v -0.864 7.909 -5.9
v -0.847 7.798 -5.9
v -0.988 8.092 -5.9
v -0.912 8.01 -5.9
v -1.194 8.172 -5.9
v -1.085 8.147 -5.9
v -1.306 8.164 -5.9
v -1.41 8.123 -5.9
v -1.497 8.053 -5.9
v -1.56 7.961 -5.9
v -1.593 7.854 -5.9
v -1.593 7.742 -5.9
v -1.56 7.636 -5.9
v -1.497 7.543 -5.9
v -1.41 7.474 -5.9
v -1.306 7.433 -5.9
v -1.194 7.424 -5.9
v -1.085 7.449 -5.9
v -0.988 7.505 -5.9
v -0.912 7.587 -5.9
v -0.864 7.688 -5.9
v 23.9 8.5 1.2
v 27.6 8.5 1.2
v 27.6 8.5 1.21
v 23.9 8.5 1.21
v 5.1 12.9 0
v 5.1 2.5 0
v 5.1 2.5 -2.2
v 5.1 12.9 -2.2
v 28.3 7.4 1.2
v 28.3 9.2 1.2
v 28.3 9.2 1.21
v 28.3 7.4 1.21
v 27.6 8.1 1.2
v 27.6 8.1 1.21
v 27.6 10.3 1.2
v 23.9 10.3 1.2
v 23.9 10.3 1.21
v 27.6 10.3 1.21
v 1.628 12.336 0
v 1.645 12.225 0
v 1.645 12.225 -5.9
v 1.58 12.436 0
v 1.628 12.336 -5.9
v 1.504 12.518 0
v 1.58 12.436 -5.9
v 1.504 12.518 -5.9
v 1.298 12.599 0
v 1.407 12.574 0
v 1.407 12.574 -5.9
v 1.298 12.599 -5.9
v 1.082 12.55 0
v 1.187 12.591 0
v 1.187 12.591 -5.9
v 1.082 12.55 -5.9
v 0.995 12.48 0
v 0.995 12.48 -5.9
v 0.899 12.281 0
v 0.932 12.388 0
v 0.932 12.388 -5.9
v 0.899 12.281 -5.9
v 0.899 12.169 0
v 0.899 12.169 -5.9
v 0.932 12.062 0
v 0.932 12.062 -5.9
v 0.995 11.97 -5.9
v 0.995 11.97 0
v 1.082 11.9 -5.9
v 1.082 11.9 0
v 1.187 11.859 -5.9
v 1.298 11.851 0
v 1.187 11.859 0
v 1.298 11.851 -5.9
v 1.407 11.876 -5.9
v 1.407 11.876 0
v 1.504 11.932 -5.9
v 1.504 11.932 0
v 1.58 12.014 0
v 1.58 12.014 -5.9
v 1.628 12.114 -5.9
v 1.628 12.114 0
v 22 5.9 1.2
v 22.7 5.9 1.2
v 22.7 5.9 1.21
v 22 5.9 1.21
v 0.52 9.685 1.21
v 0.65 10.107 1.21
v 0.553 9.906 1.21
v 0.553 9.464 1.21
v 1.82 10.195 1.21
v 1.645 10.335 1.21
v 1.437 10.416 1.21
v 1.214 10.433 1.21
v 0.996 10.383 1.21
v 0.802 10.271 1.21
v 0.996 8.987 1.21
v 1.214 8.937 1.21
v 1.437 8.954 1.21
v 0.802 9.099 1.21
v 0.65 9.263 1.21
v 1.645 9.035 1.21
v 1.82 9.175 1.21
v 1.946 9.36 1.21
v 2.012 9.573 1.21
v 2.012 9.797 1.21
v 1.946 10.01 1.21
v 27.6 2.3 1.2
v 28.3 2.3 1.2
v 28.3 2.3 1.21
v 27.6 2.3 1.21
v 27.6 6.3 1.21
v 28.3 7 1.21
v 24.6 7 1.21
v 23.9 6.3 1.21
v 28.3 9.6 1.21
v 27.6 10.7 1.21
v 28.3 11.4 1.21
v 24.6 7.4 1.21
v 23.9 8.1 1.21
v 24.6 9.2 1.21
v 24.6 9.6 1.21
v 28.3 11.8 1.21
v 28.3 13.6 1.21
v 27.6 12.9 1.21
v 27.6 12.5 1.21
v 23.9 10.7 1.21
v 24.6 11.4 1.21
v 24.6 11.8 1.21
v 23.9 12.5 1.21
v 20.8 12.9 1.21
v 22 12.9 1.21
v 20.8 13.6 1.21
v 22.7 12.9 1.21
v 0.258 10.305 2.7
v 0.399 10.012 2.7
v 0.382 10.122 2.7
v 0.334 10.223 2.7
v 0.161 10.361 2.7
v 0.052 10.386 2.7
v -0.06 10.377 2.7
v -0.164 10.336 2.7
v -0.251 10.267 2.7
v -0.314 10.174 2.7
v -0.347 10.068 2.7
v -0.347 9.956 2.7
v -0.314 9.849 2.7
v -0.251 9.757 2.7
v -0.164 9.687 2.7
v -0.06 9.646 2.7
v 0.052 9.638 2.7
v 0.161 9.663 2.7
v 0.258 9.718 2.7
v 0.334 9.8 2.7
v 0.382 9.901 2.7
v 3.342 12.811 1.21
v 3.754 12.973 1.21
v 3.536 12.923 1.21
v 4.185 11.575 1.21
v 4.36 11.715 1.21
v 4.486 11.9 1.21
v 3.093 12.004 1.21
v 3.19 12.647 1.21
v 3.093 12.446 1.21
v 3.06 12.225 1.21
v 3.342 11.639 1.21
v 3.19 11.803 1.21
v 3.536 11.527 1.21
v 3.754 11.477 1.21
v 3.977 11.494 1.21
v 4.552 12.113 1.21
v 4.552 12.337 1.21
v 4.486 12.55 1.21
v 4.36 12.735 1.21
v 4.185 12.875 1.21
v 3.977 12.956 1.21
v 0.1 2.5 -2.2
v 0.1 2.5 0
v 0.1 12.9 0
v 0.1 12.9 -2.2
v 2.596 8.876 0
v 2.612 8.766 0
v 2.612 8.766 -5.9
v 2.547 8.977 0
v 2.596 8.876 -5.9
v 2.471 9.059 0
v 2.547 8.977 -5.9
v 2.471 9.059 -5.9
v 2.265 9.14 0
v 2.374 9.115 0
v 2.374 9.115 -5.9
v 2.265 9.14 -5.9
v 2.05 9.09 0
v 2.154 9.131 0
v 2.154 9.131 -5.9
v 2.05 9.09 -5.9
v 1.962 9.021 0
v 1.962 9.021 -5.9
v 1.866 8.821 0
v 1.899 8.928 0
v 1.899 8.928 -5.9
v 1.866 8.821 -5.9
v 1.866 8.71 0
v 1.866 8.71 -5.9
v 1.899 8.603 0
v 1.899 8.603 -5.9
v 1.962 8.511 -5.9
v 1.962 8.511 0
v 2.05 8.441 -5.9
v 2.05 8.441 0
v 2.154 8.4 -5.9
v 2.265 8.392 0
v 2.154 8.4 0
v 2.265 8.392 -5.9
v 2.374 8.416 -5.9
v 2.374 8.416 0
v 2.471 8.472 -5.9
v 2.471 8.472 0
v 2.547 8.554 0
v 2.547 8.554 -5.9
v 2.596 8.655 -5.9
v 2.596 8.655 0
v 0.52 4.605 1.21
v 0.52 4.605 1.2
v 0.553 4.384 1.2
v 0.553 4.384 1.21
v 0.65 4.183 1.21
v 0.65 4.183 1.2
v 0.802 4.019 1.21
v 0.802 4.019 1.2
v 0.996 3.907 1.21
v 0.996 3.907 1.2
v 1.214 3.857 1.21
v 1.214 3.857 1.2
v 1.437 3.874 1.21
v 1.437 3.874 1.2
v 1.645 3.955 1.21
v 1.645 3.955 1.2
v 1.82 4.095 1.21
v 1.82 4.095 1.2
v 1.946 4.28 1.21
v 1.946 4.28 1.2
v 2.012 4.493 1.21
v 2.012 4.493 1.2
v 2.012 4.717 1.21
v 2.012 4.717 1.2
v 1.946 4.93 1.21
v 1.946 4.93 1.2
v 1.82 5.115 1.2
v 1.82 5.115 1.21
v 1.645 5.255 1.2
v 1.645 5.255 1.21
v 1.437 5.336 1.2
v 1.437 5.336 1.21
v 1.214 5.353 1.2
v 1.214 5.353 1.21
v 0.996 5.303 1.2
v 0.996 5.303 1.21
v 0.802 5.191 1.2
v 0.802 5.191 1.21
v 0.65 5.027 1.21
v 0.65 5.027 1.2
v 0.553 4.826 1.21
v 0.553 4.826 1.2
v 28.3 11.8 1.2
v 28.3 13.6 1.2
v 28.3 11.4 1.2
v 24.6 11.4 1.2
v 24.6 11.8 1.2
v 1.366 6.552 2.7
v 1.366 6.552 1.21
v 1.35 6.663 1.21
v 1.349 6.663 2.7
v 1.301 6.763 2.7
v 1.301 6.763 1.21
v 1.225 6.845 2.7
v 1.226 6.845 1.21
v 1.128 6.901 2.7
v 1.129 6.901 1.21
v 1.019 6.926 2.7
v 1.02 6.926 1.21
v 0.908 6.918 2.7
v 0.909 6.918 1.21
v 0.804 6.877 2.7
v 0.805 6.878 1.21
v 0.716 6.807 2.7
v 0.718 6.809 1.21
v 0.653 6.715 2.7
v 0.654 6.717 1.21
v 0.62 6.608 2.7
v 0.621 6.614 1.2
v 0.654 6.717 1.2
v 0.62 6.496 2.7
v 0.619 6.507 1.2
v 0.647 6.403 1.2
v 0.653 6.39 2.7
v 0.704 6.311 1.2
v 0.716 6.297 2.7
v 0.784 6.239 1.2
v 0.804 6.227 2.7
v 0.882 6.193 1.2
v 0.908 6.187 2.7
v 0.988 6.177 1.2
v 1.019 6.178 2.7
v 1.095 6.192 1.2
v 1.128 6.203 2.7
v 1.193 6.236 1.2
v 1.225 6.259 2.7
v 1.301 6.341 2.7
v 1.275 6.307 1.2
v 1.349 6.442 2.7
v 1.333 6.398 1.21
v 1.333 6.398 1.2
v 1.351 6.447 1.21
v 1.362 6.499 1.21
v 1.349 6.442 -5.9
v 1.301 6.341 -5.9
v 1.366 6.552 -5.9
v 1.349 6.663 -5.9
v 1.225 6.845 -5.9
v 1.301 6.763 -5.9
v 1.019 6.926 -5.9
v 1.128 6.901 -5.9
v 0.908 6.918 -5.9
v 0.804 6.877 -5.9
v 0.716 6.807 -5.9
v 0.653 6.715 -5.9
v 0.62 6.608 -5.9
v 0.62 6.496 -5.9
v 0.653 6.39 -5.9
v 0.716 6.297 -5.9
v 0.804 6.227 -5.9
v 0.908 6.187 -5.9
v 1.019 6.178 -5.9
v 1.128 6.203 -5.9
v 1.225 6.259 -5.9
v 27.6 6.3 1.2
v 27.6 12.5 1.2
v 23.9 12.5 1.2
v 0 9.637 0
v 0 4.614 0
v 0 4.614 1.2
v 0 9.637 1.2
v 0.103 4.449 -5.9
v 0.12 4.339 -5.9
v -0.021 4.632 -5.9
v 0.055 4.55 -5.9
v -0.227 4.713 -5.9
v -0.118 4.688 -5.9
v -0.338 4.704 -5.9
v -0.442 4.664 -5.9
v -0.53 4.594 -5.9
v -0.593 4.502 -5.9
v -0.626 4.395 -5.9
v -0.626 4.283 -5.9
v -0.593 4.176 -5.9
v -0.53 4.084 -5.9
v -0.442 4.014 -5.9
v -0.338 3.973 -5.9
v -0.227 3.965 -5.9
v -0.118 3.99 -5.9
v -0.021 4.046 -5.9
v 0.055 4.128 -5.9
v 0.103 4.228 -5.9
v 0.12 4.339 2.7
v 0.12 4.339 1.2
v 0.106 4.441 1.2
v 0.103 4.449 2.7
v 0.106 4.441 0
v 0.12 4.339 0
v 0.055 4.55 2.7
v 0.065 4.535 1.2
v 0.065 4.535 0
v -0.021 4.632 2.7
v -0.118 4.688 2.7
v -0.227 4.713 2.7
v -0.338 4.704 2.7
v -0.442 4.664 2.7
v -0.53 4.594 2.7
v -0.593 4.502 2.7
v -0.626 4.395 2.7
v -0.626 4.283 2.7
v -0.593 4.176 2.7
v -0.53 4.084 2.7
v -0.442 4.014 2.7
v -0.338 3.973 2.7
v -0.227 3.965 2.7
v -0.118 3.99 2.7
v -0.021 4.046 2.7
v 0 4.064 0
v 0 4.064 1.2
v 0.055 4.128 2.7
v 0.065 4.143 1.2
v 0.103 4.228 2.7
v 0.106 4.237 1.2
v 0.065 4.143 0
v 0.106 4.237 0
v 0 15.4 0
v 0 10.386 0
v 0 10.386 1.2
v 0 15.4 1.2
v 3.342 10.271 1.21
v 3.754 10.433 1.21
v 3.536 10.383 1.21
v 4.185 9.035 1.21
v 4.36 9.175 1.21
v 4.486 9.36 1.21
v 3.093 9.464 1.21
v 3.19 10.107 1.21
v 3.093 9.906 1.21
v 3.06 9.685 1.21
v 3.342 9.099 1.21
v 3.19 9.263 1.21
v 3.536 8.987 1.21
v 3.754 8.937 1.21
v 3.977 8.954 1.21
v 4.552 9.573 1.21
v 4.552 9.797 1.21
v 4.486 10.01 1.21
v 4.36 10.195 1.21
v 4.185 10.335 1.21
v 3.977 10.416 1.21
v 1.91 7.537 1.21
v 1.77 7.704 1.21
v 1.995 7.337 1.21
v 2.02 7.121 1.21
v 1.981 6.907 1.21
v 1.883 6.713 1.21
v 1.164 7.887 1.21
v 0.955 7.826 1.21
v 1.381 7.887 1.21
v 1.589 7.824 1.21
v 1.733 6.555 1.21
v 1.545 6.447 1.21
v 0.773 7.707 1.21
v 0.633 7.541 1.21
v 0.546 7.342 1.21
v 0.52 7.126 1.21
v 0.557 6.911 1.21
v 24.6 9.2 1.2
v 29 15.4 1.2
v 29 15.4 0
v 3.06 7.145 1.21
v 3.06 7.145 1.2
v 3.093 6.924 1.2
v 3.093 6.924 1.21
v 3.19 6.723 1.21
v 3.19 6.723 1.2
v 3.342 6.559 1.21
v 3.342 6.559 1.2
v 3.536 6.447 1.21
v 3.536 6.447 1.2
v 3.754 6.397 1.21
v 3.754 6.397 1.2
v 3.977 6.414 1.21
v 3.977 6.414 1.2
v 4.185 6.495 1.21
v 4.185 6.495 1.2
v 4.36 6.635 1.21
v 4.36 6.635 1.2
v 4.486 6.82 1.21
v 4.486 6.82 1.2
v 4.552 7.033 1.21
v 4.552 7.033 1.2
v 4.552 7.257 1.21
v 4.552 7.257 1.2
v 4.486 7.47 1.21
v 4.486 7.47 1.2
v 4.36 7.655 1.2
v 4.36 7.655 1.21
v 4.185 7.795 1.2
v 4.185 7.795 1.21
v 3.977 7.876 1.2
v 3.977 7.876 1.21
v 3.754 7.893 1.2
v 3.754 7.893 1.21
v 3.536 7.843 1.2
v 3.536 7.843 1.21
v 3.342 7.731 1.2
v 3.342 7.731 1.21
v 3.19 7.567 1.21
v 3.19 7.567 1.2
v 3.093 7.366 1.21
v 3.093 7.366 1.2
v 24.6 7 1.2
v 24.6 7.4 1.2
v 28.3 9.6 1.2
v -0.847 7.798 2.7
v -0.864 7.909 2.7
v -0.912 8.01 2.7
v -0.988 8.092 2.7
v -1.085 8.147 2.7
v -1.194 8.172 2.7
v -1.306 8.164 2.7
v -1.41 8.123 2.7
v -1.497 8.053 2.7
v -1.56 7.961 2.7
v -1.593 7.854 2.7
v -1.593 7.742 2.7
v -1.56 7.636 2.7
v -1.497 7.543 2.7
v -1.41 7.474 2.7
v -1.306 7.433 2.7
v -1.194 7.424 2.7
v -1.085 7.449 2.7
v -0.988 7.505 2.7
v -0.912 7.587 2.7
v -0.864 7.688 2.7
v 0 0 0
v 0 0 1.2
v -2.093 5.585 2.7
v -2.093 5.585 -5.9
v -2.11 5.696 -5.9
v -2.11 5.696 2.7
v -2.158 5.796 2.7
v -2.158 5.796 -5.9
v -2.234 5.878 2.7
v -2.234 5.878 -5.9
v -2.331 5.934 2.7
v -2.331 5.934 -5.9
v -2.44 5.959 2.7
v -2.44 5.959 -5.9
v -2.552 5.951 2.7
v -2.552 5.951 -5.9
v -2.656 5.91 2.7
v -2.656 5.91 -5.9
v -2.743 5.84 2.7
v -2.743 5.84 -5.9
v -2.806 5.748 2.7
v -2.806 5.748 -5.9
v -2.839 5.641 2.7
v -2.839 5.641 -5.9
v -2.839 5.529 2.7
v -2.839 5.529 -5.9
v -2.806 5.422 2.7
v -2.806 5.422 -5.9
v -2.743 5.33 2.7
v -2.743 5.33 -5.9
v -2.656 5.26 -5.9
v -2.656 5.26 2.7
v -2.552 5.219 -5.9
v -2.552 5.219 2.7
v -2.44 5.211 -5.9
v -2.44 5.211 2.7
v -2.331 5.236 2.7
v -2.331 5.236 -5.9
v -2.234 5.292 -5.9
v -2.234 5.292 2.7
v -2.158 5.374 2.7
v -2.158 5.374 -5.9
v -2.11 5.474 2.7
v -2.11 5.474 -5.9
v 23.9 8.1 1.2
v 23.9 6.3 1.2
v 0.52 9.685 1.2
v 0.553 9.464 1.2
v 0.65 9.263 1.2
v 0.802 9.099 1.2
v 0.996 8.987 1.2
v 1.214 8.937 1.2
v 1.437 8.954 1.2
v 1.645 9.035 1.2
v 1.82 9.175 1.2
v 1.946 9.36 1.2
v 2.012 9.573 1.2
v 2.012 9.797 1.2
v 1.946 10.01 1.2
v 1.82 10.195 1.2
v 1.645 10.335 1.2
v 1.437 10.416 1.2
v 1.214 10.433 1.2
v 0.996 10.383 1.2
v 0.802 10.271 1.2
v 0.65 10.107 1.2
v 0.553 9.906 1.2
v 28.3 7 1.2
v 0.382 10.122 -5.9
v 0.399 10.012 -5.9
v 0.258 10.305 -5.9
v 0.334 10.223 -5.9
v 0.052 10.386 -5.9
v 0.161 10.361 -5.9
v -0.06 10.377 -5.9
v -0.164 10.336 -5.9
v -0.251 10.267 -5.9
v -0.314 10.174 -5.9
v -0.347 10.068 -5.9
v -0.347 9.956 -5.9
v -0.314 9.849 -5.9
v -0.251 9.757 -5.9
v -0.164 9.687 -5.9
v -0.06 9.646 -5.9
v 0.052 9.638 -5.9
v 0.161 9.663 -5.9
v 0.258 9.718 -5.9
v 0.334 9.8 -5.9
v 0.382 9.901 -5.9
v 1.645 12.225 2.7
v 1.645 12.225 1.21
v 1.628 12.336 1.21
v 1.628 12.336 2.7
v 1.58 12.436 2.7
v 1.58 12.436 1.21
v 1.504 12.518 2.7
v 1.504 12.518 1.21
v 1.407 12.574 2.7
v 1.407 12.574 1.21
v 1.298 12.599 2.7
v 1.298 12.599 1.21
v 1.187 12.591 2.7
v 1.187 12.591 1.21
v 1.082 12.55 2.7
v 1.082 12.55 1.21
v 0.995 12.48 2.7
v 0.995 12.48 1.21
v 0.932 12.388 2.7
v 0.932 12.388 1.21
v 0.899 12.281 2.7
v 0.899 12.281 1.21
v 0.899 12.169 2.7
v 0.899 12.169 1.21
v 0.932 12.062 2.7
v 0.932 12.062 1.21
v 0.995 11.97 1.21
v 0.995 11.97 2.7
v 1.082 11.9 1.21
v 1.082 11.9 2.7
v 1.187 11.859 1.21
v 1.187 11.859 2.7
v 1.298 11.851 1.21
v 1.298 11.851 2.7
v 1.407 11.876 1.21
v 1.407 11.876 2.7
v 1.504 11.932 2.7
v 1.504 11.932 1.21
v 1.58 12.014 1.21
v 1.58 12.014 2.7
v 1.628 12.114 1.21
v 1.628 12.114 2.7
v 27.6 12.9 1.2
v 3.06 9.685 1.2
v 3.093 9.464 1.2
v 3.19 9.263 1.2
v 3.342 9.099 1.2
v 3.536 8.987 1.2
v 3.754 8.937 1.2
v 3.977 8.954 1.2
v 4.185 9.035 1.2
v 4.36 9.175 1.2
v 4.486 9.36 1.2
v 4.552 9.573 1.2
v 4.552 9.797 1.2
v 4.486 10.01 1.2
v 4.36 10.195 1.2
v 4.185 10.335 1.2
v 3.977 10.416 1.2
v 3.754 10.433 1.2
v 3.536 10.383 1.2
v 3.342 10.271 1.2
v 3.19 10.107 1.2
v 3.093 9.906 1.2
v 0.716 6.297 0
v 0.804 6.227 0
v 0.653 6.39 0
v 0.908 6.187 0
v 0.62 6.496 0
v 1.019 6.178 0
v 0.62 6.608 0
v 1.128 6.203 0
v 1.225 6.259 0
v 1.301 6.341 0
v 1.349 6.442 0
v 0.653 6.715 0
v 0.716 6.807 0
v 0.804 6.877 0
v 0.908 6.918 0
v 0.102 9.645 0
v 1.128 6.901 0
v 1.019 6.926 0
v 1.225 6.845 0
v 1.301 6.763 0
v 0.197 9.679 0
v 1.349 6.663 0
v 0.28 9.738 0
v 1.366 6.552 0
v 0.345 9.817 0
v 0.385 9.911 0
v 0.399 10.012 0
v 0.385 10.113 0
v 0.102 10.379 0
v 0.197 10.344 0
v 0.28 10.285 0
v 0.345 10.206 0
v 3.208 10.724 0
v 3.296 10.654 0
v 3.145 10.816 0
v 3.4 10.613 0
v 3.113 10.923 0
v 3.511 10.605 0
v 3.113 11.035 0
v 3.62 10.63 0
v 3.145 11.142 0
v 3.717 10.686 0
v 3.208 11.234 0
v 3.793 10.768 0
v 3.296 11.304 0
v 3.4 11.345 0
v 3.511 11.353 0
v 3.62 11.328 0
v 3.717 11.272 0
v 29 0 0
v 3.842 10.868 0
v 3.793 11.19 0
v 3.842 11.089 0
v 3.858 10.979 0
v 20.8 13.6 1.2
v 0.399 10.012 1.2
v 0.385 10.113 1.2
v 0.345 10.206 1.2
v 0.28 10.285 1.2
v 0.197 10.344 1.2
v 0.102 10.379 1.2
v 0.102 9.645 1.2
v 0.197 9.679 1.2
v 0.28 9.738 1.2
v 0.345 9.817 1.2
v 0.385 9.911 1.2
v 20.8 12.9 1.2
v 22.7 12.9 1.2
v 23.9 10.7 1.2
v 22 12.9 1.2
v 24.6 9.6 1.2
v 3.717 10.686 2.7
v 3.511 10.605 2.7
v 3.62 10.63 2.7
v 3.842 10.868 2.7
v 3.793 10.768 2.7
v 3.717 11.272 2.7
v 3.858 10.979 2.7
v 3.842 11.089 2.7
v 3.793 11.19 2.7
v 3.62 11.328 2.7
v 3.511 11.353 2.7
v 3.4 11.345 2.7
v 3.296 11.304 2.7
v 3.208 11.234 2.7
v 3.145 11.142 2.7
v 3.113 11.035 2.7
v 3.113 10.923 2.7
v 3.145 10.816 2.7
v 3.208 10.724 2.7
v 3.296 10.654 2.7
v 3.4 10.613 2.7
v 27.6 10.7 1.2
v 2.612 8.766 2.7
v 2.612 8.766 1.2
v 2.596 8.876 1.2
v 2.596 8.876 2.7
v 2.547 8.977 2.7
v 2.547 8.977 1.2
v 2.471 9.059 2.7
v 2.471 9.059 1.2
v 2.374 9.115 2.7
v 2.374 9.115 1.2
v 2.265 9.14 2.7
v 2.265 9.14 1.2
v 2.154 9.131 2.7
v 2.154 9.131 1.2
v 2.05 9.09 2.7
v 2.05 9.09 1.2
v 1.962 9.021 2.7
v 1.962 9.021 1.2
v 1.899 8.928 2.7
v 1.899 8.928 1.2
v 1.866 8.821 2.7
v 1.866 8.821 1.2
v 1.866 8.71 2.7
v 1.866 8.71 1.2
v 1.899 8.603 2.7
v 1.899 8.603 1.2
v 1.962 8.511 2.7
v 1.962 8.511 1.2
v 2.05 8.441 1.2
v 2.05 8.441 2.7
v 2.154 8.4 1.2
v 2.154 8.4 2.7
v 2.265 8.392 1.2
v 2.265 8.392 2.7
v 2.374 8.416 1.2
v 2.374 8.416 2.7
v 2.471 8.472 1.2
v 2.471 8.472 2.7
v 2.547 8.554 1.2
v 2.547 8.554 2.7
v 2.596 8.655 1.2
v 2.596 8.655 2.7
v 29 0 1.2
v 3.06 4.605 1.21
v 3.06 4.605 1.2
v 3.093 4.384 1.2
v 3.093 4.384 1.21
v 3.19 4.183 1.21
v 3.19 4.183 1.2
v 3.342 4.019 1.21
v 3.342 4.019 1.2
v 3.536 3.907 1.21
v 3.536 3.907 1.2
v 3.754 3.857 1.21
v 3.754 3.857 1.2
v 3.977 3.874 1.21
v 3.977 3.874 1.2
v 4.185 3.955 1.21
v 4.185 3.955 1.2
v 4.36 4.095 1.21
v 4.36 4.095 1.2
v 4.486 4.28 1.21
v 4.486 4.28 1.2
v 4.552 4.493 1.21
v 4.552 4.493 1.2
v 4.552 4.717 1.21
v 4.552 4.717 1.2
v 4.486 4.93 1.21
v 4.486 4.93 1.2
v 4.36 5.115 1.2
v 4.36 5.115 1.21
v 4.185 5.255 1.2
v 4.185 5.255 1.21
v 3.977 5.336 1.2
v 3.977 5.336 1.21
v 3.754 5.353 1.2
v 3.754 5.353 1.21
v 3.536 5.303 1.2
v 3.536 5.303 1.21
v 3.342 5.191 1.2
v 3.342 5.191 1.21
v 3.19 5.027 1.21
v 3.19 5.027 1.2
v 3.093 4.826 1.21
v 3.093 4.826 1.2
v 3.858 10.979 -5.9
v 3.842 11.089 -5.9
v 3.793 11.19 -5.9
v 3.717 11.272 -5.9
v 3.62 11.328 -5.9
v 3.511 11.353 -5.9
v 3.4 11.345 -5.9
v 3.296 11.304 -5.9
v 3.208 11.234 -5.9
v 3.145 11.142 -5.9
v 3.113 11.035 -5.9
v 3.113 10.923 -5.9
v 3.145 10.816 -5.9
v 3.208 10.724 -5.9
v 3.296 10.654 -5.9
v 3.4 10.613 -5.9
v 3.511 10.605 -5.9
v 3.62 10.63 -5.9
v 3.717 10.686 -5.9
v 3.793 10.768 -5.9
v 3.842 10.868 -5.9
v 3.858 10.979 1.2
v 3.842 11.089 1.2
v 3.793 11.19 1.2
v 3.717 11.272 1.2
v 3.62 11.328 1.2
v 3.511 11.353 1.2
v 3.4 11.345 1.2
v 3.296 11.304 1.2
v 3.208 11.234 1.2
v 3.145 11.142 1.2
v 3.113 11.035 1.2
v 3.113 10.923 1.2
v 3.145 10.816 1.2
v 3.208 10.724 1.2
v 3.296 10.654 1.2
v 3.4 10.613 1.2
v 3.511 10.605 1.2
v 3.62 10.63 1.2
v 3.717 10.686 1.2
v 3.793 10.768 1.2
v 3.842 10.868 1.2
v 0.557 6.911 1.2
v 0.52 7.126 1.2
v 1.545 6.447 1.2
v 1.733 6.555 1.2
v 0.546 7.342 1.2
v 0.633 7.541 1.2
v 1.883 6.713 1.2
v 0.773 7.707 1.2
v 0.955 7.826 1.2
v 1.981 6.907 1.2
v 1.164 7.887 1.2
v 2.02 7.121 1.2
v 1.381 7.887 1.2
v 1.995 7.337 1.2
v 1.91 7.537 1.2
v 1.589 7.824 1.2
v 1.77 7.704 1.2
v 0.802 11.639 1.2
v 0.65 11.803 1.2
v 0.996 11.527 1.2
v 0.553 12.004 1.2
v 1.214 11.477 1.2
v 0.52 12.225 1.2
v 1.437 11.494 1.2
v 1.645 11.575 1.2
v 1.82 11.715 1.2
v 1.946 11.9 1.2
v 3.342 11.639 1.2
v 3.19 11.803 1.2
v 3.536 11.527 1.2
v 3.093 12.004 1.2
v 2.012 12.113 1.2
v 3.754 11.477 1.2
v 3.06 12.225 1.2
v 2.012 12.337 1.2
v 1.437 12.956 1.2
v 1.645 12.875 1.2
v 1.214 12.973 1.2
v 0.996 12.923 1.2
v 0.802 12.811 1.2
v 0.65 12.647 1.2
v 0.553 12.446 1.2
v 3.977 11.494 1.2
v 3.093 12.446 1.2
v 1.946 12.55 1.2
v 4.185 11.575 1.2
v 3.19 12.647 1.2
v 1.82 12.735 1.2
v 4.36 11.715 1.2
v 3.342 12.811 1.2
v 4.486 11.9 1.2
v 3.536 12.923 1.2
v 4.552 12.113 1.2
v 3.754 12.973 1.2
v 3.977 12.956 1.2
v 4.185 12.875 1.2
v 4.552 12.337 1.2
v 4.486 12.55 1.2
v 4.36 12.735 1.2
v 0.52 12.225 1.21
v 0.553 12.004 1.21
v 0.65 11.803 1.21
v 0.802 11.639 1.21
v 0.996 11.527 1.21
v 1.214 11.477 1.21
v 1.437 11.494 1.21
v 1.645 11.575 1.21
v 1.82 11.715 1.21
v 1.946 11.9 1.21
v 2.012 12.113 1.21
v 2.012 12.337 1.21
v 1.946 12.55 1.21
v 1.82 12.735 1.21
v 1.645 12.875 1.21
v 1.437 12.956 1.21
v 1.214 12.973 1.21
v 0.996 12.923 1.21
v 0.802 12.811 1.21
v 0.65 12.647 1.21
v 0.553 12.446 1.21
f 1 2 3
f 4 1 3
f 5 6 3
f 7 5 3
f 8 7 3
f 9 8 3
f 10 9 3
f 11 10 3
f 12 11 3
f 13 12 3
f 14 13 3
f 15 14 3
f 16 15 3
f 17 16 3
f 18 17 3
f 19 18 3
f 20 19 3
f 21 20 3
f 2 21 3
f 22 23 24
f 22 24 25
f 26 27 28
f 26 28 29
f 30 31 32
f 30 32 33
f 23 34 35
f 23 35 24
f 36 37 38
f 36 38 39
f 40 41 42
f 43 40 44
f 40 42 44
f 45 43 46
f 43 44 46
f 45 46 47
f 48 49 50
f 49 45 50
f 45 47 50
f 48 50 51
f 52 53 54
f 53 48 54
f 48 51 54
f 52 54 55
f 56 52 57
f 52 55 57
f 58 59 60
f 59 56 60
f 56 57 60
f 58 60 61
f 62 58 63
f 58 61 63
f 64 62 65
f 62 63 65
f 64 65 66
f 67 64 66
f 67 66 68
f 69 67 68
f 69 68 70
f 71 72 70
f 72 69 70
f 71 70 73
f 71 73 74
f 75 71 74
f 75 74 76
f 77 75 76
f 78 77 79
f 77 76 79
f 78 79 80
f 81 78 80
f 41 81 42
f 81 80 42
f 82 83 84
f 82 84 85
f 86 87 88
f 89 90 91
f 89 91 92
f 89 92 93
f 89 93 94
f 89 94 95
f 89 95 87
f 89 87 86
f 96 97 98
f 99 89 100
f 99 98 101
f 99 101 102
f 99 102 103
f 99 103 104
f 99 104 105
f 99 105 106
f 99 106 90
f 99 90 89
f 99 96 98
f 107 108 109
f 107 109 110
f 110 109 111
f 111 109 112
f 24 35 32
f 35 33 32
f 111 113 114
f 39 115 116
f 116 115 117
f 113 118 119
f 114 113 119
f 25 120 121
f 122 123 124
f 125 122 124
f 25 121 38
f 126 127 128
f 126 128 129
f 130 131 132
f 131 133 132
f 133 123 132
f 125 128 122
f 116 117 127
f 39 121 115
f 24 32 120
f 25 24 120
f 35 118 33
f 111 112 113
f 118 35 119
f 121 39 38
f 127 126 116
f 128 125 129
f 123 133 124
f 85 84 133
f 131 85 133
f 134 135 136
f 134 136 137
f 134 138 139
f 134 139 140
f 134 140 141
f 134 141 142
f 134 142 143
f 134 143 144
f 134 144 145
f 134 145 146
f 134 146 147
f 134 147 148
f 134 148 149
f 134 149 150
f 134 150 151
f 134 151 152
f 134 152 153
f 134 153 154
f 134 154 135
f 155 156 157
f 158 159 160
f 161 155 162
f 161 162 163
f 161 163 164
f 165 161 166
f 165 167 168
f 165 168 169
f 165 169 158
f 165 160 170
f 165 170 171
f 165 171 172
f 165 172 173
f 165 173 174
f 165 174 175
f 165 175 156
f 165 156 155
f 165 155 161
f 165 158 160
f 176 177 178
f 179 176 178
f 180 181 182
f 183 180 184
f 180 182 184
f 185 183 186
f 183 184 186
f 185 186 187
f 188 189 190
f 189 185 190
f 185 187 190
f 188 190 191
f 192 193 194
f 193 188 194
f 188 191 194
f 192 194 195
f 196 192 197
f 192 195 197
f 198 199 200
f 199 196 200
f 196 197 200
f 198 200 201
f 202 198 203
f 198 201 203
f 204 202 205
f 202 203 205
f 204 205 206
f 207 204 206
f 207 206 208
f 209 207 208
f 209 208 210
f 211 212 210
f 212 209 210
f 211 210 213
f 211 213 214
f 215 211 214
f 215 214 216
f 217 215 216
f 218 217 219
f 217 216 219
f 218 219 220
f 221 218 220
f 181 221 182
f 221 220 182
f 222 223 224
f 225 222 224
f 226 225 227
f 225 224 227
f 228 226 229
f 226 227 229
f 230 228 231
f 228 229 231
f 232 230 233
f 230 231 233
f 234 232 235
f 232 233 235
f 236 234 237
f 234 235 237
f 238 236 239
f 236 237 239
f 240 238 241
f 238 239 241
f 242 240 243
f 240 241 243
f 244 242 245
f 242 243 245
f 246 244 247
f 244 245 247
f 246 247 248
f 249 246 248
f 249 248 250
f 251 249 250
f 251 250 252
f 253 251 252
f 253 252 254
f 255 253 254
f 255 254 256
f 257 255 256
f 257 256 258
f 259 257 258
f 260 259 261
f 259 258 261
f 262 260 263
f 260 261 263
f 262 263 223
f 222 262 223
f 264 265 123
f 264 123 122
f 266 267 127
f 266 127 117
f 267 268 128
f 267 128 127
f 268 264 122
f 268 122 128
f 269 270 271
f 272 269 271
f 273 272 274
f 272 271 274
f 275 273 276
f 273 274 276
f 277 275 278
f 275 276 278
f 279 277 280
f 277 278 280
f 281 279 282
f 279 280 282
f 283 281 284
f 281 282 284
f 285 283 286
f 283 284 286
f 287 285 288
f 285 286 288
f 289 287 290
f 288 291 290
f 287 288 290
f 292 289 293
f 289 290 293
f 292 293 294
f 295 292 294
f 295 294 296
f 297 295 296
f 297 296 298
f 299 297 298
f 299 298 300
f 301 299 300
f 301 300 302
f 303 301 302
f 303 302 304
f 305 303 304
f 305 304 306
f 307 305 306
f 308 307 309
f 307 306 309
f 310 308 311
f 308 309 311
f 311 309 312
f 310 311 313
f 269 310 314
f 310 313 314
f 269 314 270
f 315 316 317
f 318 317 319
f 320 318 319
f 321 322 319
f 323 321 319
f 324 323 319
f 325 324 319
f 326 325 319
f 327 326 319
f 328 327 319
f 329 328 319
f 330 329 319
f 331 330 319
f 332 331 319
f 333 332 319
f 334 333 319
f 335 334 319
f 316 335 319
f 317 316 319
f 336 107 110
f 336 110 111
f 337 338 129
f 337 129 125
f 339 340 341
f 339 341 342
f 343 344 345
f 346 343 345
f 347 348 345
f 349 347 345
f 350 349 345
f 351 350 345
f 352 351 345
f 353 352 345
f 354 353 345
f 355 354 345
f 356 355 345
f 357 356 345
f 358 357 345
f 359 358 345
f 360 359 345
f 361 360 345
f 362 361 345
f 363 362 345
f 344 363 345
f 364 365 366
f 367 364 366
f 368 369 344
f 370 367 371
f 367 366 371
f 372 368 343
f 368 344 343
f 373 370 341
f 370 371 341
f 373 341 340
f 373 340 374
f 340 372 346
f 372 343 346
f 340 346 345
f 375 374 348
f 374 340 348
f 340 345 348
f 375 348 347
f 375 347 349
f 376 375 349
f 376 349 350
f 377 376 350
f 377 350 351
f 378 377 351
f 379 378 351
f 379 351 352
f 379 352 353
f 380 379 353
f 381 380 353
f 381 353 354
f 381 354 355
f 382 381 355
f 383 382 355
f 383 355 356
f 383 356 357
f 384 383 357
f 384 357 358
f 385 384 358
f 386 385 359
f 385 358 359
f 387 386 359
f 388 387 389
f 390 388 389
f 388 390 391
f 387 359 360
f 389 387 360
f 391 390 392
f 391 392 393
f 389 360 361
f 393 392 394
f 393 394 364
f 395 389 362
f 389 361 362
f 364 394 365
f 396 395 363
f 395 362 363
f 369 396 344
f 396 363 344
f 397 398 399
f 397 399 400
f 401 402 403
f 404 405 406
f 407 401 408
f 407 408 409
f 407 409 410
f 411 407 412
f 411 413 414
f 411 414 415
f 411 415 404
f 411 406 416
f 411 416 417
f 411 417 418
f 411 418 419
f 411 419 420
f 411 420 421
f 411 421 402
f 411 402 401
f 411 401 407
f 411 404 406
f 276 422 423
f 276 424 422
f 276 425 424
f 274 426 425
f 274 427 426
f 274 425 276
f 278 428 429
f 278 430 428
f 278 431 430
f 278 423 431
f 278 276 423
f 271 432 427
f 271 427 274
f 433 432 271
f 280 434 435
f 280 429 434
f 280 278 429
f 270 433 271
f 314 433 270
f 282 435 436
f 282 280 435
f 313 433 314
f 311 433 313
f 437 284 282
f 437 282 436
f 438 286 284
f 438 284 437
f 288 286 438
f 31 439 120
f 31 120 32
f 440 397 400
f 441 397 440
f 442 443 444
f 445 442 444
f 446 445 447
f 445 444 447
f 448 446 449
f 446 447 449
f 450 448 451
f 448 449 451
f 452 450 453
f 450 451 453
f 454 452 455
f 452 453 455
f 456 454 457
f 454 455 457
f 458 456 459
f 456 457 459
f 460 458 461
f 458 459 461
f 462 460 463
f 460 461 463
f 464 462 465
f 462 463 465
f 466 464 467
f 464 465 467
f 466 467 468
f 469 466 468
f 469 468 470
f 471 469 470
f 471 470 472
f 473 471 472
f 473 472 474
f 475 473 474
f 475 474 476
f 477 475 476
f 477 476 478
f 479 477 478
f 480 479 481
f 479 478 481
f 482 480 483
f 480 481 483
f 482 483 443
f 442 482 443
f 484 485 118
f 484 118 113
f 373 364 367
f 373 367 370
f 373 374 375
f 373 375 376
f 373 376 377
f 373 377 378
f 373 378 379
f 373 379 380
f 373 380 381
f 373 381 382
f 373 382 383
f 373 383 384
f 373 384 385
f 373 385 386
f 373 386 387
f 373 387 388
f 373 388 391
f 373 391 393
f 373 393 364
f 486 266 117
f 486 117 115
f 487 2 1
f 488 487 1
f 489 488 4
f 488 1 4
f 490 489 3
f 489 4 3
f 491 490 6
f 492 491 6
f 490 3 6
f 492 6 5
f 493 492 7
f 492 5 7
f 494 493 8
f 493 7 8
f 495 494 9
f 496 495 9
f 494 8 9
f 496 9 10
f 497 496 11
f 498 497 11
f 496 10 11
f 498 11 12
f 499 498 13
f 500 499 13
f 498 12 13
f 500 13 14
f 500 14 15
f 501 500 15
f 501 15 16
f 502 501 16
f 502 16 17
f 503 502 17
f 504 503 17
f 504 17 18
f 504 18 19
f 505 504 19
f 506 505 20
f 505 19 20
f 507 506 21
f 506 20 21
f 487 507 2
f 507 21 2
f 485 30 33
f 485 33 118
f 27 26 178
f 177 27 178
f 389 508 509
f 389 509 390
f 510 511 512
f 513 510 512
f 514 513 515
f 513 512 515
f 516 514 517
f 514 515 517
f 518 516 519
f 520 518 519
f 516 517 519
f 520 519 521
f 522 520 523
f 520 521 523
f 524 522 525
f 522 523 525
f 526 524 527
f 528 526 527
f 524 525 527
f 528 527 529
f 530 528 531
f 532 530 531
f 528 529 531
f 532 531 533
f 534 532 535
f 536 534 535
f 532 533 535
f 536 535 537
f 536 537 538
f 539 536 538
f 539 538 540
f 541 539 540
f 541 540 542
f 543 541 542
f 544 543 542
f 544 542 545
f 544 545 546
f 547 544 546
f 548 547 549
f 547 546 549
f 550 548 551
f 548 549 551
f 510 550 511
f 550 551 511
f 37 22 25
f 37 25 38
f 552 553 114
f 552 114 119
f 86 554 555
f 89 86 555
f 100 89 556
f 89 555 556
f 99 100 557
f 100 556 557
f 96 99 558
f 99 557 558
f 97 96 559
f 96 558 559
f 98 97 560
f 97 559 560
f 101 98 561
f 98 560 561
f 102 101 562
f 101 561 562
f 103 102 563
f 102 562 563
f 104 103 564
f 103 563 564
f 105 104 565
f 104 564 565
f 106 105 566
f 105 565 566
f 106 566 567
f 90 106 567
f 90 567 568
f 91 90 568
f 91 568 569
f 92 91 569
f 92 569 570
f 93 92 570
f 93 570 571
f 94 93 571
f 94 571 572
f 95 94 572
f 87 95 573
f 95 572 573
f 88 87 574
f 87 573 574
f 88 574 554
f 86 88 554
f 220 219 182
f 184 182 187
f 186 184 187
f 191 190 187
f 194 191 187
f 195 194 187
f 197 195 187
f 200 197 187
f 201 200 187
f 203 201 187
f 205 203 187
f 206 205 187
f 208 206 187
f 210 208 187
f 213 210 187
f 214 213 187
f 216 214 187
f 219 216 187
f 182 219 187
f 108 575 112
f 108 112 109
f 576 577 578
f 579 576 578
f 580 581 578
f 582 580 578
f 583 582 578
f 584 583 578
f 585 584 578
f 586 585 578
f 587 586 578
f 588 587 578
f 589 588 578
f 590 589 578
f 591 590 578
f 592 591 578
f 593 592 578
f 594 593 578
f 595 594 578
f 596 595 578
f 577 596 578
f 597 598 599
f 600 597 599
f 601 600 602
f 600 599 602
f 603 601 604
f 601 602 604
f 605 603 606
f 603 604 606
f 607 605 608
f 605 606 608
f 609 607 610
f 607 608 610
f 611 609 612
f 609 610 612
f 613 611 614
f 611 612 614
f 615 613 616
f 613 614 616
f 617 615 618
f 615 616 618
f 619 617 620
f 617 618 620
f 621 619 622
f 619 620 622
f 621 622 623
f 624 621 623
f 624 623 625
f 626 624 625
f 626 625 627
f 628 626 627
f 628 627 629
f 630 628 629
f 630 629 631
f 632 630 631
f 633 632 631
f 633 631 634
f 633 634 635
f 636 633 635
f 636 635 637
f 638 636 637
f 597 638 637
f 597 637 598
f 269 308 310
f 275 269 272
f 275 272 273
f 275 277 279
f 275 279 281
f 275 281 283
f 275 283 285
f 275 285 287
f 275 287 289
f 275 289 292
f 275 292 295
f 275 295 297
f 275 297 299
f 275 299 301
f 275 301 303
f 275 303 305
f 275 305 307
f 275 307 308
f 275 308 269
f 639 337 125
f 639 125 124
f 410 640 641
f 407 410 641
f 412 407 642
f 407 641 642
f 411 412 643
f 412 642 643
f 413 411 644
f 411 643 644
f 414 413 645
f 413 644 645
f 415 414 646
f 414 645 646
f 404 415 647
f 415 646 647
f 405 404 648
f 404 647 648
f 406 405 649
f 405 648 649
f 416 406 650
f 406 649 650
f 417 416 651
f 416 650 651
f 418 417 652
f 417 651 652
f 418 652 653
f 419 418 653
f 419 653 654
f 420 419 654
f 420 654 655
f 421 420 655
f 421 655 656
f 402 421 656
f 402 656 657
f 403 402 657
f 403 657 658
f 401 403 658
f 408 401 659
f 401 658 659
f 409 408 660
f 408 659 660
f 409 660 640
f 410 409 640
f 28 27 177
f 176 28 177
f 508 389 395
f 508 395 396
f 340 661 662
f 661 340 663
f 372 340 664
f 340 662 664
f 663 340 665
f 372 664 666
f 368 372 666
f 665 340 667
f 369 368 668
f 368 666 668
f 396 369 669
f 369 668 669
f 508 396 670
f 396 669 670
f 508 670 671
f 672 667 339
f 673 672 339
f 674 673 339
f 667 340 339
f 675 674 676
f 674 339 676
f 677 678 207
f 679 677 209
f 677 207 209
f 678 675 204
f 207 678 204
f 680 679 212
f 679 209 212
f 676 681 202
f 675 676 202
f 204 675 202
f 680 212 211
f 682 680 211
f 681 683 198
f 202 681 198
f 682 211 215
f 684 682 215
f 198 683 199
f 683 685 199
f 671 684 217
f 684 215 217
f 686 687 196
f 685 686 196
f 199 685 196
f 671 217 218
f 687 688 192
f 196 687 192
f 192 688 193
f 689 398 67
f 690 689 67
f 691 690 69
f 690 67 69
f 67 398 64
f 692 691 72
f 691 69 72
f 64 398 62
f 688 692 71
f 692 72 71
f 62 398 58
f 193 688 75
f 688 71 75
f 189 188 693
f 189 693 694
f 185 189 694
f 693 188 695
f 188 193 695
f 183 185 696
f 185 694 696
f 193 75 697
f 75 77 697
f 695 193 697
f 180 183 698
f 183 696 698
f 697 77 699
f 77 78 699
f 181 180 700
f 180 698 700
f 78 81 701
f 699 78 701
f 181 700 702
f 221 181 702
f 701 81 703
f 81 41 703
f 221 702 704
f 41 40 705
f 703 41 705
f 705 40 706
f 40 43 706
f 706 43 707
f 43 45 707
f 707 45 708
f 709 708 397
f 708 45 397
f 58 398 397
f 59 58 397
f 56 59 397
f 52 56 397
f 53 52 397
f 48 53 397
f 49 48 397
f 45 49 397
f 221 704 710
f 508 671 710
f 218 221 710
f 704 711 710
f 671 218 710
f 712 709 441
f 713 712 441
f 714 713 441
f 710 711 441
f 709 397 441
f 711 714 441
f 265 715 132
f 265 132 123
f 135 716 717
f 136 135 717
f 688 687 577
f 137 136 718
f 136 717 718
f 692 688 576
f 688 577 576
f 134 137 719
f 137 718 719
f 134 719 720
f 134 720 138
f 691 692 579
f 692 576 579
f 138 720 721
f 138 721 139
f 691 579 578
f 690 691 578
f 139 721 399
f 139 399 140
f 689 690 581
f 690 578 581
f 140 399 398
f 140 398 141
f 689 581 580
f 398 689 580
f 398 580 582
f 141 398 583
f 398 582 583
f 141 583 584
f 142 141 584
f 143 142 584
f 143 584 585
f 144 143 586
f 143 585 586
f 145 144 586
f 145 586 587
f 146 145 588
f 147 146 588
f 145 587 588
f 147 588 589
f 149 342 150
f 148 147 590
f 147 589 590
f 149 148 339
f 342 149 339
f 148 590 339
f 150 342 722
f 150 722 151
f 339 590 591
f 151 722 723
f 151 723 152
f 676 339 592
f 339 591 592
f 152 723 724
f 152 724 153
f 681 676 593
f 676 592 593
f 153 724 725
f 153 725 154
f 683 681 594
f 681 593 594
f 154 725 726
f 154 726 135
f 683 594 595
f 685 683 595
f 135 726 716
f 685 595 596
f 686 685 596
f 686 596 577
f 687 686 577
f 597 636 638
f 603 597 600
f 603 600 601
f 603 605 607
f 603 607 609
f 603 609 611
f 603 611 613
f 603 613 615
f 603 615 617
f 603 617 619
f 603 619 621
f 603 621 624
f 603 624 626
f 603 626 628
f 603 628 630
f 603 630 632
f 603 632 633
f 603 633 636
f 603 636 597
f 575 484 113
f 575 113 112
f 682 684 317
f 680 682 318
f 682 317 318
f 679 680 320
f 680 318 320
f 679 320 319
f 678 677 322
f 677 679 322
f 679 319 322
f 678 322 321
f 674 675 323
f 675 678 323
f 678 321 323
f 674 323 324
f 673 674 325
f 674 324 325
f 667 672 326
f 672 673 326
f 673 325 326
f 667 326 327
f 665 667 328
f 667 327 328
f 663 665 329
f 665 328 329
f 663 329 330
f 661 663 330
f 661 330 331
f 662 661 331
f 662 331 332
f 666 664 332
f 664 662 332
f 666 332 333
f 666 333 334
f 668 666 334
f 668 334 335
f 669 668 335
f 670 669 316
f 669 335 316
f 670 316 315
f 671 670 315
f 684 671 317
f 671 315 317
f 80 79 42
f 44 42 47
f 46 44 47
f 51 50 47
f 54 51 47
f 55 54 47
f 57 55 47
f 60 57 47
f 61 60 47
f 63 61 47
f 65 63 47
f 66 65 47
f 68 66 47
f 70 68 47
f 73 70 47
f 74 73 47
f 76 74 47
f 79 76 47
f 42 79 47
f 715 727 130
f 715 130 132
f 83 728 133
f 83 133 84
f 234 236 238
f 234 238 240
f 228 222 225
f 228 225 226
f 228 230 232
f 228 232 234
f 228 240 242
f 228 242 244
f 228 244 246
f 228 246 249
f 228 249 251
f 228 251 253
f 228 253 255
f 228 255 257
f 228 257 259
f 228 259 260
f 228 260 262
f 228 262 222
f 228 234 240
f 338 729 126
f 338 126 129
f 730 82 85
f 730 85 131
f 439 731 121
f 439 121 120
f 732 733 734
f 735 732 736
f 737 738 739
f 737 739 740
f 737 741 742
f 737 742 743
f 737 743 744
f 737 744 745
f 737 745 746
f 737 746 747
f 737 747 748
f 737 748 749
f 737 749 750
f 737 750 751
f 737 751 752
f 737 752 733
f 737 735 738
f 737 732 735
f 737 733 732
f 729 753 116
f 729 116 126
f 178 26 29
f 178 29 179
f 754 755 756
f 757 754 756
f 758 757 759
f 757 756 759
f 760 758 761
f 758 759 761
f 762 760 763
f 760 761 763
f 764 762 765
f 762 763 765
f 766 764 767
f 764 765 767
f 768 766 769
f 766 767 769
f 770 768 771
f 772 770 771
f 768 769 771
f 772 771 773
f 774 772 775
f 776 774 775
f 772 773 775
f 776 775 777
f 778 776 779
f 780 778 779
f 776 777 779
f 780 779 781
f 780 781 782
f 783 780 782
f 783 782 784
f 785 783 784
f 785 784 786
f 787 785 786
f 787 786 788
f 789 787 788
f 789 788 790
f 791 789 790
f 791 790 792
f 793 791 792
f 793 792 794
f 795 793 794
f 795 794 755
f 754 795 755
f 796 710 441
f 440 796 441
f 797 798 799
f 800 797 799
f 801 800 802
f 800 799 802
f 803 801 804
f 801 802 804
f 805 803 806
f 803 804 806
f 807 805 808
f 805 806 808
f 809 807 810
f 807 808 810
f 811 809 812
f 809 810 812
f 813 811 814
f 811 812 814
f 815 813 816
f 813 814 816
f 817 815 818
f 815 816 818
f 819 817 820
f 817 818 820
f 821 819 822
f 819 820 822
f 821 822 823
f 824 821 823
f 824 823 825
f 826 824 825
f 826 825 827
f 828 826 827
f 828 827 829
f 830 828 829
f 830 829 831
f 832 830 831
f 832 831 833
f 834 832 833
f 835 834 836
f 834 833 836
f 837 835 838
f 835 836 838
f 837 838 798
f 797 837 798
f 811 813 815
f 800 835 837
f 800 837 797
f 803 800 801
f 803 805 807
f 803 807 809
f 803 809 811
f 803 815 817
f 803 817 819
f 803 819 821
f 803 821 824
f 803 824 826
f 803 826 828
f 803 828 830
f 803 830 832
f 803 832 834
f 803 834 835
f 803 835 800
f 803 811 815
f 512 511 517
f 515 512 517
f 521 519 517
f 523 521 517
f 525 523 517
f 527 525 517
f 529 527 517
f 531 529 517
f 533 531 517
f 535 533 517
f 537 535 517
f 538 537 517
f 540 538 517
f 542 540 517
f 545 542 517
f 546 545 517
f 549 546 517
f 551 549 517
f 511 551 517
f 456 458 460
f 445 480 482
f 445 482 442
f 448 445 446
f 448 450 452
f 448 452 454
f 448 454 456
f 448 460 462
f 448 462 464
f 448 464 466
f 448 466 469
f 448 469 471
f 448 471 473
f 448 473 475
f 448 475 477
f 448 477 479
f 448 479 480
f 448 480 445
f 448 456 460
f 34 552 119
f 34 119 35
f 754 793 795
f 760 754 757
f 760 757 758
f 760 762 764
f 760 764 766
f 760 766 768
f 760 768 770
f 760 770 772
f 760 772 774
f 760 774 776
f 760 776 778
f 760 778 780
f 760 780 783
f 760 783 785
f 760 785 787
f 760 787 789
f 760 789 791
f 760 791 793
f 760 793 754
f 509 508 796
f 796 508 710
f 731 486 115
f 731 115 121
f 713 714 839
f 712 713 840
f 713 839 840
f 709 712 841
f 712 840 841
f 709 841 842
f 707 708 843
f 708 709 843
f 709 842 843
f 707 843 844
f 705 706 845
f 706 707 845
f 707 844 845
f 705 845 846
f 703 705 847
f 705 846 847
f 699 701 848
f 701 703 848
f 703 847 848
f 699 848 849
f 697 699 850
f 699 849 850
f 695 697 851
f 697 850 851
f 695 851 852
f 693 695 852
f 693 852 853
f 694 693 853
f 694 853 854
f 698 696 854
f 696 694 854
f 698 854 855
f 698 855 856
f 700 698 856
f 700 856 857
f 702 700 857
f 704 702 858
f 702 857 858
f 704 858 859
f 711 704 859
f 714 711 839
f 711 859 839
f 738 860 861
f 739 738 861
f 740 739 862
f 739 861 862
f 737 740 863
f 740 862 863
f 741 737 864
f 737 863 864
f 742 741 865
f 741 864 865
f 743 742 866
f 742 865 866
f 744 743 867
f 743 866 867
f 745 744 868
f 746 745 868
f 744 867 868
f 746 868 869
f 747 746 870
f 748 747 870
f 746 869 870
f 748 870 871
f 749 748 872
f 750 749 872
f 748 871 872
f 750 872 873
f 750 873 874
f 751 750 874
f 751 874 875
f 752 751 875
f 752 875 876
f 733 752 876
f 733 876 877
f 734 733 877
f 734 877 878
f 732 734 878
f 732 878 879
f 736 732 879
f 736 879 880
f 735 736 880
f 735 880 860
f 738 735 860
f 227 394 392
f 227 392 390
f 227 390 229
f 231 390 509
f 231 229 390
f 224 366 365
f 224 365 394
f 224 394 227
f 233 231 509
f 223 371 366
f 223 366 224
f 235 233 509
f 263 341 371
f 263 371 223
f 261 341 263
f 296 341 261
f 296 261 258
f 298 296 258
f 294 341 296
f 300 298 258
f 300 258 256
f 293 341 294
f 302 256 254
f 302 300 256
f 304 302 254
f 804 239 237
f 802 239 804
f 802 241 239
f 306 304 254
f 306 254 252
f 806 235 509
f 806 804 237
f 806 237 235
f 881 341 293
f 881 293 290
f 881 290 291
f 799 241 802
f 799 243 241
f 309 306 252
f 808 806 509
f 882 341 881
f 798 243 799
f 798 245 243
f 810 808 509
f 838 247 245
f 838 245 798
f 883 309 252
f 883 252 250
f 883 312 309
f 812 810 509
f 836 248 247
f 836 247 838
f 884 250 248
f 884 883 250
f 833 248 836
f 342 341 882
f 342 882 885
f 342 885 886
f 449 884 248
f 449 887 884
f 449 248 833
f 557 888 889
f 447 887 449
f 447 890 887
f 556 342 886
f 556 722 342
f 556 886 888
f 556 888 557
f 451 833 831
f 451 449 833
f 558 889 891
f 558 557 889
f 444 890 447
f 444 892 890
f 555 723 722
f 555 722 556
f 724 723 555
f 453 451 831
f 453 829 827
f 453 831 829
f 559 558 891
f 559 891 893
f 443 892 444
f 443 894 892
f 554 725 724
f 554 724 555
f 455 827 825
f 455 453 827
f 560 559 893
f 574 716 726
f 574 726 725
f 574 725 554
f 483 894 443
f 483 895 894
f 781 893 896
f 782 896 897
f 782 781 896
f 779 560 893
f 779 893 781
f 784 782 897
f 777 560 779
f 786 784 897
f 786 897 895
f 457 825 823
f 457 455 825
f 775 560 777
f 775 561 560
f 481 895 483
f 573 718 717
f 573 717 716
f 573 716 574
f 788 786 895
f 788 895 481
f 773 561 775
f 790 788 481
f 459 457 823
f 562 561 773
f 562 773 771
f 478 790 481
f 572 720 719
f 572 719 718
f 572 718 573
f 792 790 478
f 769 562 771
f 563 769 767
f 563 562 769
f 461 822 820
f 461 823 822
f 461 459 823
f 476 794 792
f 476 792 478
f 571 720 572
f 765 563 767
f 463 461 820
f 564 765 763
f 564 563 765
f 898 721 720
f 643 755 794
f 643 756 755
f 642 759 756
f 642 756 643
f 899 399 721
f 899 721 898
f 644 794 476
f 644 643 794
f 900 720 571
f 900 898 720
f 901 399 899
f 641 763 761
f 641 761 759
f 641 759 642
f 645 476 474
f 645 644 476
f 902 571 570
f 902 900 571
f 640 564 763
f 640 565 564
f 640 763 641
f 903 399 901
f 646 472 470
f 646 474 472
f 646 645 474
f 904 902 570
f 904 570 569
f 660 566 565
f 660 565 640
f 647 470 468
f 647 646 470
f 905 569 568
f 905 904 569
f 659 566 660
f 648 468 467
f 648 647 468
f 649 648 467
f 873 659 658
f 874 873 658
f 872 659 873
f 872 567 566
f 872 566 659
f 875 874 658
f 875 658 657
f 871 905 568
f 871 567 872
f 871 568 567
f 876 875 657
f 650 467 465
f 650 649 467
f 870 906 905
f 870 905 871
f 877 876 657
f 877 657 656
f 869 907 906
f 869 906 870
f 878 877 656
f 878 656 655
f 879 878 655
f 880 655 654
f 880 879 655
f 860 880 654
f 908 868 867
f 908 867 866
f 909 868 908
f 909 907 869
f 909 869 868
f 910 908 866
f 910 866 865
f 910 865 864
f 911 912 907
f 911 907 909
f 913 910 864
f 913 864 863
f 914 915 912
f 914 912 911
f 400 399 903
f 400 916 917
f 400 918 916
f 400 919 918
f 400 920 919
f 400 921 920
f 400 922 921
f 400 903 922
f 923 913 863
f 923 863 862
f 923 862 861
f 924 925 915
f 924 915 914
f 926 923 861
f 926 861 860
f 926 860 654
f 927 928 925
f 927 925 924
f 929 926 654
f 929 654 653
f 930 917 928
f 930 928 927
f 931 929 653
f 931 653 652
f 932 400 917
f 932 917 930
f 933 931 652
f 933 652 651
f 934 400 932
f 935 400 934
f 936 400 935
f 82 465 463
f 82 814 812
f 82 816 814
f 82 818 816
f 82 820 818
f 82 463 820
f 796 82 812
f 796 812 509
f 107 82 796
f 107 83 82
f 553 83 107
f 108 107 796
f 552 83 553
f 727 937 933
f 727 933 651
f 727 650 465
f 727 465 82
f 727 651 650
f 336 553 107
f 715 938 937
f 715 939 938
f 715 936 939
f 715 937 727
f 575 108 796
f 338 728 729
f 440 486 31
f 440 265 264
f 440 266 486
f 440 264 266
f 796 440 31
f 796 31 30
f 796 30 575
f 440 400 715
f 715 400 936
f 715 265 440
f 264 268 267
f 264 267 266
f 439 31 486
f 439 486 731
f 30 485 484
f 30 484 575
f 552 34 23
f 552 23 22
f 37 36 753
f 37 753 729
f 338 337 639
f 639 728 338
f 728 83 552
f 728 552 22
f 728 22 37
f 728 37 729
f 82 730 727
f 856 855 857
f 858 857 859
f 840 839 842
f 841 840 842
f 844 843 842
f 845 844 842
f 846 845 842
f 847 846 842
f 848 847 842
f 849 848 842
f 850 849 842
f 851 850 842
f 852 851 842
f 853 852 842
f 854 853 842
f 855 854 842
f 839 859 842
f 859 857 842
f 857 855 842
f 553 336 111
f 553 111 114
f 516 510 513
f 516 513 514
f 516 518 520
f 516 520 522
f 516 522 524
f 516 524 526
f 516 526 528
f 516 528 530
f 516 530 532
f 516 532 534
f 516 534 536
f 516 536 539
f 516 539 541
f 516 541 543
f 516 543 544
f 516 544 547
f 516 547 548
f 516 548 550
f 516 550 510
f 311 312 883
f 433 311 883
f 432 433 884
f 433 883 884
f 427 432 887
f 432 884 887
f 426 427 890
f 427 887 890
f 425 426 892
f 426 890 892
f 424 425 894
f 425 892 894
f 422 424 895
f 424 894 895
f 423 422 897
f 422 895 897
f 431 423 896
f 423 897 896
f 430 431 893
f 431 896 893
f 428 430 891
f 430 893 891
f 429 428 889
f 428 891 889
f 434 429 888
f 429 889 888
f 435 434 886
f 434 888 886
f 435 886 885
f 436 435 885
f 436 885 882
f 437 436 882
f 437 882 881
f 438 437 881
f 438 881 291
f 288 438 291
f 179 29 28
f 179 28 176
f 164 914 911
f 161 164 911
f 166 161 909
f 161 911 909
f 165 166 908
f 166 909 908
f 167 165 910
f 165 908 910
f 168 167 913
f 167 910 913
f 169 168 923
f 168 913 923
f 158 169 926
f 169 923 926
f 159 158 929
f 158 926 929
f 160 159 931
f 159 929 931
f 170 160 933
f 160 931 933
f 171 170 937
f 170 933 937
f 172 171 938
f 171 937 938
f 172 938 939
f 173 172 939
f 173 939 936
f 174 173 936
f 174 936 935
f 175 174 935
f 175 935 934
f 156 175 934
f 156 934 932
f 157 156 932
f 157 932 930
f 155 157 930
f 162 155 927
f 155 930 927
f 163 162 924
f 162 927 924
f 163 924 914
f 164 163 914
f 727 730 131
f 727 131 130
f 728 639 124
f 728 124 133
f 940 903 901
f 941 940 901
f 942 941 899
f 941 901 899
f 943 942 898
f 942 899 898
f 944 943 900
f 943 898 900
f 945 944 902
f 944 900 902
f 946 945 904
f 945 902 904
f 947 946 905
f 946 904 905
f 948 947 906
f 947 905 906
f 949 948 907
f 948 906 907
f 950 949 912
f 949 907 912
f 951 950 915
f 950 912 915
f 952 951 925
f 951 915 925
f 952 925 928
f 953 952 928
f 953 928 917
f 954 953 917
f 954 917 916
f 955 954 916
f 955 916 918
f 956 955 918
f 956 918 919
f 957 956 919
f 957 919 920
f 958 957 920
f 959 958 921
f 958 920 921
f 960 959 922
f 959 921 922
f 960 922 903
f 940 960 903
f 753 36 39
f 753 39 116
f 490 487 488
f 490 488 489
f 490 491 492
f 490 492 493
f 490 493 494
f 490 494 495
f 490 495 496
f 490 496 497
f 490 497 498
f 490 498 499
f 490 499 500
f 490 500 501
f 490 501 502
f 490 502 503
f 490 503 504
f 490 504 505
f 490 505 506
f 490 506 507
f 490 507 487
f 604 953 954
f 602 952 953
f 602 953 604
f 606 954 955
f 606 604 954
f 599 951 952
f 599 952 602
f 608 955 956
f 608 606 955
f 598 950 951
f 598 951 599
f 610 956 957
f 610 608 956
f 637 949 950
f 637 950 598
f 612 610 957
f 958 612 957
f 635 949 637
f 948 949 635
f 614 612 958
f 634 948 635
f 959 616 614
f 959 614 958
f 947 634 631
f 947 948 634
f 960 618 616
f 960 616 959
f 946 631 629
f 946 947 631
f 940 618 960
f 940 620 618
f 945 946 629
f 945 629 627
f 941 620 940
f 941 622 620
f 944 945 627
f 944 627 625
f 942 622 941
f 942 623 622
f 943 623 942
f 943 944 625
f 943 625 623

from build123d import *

# Parameters (mm, degrees)
SKETCH2_W                = 29
SKETCH2_H                = 15.4
BOSS_EXTRUDE1_DEPTH      = 1.2
SKETCH3_R                = 0.75
BOSS_EXTRUDE2_DEPTH      = 0.01
BOSS_EXTRUDE3_DEPTH      = 1.5
BOSS_EXTRUDE3_DEPTH_BACK = 7.1
SKETCH4_R                = 0.375
BOSS_EXTRUDE4_DEPTH      = 0.01
SKETCH6_W                = 5
SKETCH6_H                = 10.4
BOSS_EXTRUDE5_DEPTH      = 2.2


with BuildPart() as part:
    # Sketch2 → Boss-Extrude1 (new body)
    with BuildSketch(Plane.XY):
        with Locations((14.5, 7.7)):
            Rectangle(SKETCH2_W, SKETCH2_H)
    extrude(amount=BOSS_EXTRUDE1_DEPTH)

    # Sketch3 → Boss-Extrude2 (add)
    with BuildSketch(Plane.XY.offset(1.2)):
        with Locations(Location((1.27, 12.225, 0), (0, 0, 180))):
            Circle(SKETCH3_R)
        with Locations(Location((3.81, 12.225, 0), (0, 0, 180))):
            Circle(SKETCH3_R)
        with Locations(Location((3.81, 9.685, 0), (0, 0, 180))):
            Circle(SKETCH3_R)
        with Locations(Location((3.81, 7.145, 0), (0, 0, 180))):
            Circle(SKETCH3_R)
        with Locations(Location((3.81, 4.605, 0), (0, 0, 180))):
            Circle(SKETCH3_R)
        with Locations(Location((1.27, 9.685, 0), (0, 0, 180))):
            Circle(SKETCH3_R)
        with Locations(Location((1.27, 7.145, 0), (0, 0, 180))):
            Circle(SKETCH3_R)
        with Locations(Location((1.27, 4.605, 0), (0, 0, 180))):
            Circle(SKETCH3_R)
    extrude(amount=BOSS_EXTRUDE2_DEPTH)

    # Sketch4 → Boss-Extrude3 (add, two sides: drawn at the far end of the back side and taken through both)
    with BuildSketch(Plane.XY.offset(1.2).offset(-BOSS_EXTRUDE3_DEPTH_BACK)):
        with Locations((1.27, 12.225)):
            Circle(SKETCH4_R)
        with Locations((3.483336278, 10.978909104)):
            Circle(SKETCH4_R)
        with Locations((2.237245381, 8.765572826)):
            Circle(SKETCH4_R)
        with Locations((0.991154485, 6.552236548)):
            Circle(SKETCH4_R)
        with Locations((-0.254936412, 4.338900271)):
            Circle(SKETCH4_R)
        with Locations((0.023909104, 10.011663722)):
            Circle(SKETCH4_R)
        with Locations((-1.222181793, 7.798327445)):
            Circle(SKETCH4_R)
        with Locations((-2.468272689, 5.584991167)):
            Circle(SKETCH4_R)
    extrude(amount=BOSS_EXTRUDE3_DEPTH + BOSS_EXTRUDE3_DEPTH_BACK)


with BuildPart() as boss_extrude3_piece_1:
    # of the separate pieces the step leaves, piece 1, a body of its own (boss_extrude3_pieces)
    add(part.part.solids().sort_by_distance((0, 0, 0))[0])

    # Sketch5 → Boss-Extrude4 (add)
    with BuildSketch(Plane.XY.offset(1.2)):
        Polygon((20.8, 13.6), (28.3, 13.6), (28.3, 11.8), (24.6, 11.8), (24.6, 11.4), (28.3, 11.4), (28.3, 9.6), (24.6, 9.6), (24.6, 9.2), (28.3, 9.2), (28.3, 7.4), (24.6, 7.4), (24.6, 7), (28.3, 7), (28.3, 2.3), (27.6, 2.3), (27.6, 6.3), (23.9, 6.3), (23.9, 8.1), (27.6, 8.1), (27.6, 8.5), (23.9, 8.5), (23.9, 10.3), (27.6, 10.3), (27.6, 10.7), (23.9, 10.7), (23.9, 12.5), (27.6, 12.5), (27.6, 12.9), (22.7, 12.9), (22.7, 5.9), (22, 5.9), (22, 12.9), (20.8, 12.9), align=None)
    extrude(amount=BOSS_EXTRUDE4_DEPTH)


with BuildPart() as boss_extrude3_piece_2:
    # of the separate pieces the step leaves, piece 2, a body of its own (boss_extrude3_pieces)
    add(part.part.solids().sort_by_distance((-0.847181793, 7.798327445, 1.2))[0])


with BuildPart() as boss_extrude3_piece_3:
    # of the separate pieces the step leaves, piece 3, a body of its own (boss_extrude3_pieces)
    add(part.part.solids().sort_by_distance((-2.093272689, 5.584991167, 1.2))[0])


with BuildPart() as body_4:
    # Sketch6 → Boss-Extrude5 (new body)
    with BuildSketch(Plane(origin=(0, 0, 0), x_dir=(-1, 0, 0), z_dir=(0, 0, -1))):
        with Locations((-2.6, 7.7)):
            Rectangle(SKETCH6_W, SKETCH6_H)
    extrude(amount=BOSS_EXTRUDE5_DEPTH)


solid = Compound([boss_extrude3_piece_1.part, boss_extrude3_piece_2.part, boss_extrude3_piece_3.part, body_4.part])
